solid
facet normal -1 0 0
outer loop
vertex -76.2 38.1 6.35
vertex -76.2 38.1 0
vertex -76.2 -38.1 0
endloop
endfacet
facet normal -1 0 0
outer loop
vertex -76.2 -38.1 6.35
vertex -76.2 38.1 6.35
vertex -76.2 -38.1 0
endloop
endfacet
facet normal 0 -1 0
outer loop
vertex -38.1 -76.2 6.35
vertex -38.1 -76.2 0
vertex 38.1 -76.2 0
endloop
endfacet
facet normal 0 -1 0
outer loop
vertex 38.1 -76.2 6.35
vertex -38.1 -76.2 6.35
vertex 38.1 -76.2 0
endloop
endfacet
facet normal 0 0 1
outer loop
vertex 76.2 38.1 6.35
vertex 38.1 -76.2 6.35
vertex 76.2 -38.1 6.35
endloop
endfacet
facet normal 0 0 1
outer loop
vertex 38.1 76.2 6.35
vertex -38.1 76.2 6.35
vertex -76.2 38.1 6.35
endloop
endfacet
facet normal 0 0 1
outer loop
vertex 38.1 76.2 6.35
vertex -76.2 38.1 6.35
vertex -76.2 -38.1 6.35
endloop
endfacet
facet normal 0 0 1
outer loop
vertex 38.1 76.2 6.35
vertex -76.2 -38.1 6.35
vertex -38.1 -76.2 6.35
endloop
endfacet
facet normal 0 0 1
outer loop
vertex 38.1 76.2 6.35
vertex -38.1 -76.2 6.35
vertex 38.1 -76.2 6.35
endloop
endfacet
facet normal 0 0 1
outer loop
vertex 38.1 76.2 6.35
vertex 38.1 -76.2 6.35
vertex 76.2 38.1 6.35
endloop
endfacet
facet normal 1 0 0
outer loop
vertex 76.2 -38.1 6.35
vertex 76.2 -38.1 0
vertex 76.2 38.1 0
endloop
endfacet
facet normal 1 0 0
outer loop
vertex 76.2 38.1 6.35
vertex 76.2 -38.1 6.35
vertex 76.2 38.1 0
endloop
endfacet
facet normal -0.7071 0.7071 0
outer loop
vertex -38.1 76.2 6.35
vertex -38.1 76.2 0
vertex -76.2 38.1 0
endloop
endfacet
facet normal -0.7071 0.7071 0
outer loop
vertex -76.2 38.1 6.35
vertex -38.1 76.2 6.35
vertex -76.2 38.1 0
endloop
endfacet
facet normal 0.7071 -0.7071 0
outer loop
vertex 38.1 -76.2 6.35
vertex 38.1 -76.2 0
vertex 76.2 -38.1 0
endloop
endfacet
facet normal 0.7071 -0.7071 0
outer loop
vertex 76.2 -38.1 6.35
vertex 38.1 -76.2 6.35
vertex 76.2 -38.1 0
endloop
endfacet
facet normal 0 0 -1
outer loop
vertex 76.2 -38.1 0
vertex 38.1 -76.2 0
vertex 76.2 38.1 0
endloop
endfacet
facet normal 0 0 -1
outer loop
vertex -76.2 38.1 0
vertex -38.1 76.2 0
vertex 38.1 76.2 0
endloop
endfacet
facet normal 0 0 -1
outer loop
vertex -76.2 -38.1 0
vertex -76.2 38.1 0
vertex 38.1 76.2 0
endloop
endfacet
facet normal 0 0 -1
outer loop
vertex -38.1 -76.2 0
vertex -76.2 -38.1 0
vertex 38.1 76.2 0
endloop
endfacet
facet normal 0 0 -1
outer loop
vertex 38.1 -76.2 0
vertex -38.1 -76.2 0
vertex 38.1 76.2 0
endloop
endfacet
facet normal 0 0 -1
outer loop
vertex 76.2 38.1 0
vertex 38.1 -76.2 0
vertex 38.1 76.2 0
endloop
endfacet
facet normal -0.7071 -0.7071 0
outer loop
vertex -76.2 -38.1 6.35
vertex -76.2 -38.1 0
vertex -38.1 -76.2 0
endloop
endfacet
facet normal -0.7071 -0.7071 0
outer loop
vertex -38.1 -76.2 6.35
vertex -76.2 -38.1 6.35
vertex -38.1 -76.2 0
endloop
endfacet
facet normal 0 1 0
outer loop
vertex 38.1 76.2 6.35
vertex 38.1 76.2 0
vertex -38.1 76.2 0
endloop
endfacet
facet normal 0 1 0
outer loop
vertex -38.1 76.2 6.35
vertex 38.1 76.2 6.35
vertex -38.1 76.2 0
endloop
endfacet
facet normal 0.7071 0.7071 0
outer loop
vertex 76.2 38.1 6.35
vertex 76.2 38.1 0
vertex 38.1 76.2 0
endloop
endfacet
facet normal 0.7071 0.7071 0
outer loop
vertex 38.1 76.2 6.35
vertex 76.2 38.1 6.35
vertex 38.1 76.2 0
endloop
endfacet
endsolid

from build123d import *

# Parameters (mm, degrees)
F1_DEPTH = 6.35


with BuildPart() as f1:
    # F0 (on Top) → F1 (new body)
    with BuildSketch(Plane.XY):
        Polygon((0, -76.2), (0, 0), (-76.2, 0), (-76.2, -38.1), (-38.1, -76.2), align=None)
        Polygon((0, 76.2), (0, 0), (76.2, 0), (76.2, 38.1), (38.1, 76.2), align=None)
        Polygon((-76.2, 0), (0, 0), (0, 76.2), (-38.1, 76.2), (-76.2, 38.1), align=None)
        Polygon((76.2, 0), (0, 0), (0, -76.2), (38.1, -76.2), (76.2, -38.1), align=None)
    extrude(amount=F1_DEPTH)


solid = f1.part
